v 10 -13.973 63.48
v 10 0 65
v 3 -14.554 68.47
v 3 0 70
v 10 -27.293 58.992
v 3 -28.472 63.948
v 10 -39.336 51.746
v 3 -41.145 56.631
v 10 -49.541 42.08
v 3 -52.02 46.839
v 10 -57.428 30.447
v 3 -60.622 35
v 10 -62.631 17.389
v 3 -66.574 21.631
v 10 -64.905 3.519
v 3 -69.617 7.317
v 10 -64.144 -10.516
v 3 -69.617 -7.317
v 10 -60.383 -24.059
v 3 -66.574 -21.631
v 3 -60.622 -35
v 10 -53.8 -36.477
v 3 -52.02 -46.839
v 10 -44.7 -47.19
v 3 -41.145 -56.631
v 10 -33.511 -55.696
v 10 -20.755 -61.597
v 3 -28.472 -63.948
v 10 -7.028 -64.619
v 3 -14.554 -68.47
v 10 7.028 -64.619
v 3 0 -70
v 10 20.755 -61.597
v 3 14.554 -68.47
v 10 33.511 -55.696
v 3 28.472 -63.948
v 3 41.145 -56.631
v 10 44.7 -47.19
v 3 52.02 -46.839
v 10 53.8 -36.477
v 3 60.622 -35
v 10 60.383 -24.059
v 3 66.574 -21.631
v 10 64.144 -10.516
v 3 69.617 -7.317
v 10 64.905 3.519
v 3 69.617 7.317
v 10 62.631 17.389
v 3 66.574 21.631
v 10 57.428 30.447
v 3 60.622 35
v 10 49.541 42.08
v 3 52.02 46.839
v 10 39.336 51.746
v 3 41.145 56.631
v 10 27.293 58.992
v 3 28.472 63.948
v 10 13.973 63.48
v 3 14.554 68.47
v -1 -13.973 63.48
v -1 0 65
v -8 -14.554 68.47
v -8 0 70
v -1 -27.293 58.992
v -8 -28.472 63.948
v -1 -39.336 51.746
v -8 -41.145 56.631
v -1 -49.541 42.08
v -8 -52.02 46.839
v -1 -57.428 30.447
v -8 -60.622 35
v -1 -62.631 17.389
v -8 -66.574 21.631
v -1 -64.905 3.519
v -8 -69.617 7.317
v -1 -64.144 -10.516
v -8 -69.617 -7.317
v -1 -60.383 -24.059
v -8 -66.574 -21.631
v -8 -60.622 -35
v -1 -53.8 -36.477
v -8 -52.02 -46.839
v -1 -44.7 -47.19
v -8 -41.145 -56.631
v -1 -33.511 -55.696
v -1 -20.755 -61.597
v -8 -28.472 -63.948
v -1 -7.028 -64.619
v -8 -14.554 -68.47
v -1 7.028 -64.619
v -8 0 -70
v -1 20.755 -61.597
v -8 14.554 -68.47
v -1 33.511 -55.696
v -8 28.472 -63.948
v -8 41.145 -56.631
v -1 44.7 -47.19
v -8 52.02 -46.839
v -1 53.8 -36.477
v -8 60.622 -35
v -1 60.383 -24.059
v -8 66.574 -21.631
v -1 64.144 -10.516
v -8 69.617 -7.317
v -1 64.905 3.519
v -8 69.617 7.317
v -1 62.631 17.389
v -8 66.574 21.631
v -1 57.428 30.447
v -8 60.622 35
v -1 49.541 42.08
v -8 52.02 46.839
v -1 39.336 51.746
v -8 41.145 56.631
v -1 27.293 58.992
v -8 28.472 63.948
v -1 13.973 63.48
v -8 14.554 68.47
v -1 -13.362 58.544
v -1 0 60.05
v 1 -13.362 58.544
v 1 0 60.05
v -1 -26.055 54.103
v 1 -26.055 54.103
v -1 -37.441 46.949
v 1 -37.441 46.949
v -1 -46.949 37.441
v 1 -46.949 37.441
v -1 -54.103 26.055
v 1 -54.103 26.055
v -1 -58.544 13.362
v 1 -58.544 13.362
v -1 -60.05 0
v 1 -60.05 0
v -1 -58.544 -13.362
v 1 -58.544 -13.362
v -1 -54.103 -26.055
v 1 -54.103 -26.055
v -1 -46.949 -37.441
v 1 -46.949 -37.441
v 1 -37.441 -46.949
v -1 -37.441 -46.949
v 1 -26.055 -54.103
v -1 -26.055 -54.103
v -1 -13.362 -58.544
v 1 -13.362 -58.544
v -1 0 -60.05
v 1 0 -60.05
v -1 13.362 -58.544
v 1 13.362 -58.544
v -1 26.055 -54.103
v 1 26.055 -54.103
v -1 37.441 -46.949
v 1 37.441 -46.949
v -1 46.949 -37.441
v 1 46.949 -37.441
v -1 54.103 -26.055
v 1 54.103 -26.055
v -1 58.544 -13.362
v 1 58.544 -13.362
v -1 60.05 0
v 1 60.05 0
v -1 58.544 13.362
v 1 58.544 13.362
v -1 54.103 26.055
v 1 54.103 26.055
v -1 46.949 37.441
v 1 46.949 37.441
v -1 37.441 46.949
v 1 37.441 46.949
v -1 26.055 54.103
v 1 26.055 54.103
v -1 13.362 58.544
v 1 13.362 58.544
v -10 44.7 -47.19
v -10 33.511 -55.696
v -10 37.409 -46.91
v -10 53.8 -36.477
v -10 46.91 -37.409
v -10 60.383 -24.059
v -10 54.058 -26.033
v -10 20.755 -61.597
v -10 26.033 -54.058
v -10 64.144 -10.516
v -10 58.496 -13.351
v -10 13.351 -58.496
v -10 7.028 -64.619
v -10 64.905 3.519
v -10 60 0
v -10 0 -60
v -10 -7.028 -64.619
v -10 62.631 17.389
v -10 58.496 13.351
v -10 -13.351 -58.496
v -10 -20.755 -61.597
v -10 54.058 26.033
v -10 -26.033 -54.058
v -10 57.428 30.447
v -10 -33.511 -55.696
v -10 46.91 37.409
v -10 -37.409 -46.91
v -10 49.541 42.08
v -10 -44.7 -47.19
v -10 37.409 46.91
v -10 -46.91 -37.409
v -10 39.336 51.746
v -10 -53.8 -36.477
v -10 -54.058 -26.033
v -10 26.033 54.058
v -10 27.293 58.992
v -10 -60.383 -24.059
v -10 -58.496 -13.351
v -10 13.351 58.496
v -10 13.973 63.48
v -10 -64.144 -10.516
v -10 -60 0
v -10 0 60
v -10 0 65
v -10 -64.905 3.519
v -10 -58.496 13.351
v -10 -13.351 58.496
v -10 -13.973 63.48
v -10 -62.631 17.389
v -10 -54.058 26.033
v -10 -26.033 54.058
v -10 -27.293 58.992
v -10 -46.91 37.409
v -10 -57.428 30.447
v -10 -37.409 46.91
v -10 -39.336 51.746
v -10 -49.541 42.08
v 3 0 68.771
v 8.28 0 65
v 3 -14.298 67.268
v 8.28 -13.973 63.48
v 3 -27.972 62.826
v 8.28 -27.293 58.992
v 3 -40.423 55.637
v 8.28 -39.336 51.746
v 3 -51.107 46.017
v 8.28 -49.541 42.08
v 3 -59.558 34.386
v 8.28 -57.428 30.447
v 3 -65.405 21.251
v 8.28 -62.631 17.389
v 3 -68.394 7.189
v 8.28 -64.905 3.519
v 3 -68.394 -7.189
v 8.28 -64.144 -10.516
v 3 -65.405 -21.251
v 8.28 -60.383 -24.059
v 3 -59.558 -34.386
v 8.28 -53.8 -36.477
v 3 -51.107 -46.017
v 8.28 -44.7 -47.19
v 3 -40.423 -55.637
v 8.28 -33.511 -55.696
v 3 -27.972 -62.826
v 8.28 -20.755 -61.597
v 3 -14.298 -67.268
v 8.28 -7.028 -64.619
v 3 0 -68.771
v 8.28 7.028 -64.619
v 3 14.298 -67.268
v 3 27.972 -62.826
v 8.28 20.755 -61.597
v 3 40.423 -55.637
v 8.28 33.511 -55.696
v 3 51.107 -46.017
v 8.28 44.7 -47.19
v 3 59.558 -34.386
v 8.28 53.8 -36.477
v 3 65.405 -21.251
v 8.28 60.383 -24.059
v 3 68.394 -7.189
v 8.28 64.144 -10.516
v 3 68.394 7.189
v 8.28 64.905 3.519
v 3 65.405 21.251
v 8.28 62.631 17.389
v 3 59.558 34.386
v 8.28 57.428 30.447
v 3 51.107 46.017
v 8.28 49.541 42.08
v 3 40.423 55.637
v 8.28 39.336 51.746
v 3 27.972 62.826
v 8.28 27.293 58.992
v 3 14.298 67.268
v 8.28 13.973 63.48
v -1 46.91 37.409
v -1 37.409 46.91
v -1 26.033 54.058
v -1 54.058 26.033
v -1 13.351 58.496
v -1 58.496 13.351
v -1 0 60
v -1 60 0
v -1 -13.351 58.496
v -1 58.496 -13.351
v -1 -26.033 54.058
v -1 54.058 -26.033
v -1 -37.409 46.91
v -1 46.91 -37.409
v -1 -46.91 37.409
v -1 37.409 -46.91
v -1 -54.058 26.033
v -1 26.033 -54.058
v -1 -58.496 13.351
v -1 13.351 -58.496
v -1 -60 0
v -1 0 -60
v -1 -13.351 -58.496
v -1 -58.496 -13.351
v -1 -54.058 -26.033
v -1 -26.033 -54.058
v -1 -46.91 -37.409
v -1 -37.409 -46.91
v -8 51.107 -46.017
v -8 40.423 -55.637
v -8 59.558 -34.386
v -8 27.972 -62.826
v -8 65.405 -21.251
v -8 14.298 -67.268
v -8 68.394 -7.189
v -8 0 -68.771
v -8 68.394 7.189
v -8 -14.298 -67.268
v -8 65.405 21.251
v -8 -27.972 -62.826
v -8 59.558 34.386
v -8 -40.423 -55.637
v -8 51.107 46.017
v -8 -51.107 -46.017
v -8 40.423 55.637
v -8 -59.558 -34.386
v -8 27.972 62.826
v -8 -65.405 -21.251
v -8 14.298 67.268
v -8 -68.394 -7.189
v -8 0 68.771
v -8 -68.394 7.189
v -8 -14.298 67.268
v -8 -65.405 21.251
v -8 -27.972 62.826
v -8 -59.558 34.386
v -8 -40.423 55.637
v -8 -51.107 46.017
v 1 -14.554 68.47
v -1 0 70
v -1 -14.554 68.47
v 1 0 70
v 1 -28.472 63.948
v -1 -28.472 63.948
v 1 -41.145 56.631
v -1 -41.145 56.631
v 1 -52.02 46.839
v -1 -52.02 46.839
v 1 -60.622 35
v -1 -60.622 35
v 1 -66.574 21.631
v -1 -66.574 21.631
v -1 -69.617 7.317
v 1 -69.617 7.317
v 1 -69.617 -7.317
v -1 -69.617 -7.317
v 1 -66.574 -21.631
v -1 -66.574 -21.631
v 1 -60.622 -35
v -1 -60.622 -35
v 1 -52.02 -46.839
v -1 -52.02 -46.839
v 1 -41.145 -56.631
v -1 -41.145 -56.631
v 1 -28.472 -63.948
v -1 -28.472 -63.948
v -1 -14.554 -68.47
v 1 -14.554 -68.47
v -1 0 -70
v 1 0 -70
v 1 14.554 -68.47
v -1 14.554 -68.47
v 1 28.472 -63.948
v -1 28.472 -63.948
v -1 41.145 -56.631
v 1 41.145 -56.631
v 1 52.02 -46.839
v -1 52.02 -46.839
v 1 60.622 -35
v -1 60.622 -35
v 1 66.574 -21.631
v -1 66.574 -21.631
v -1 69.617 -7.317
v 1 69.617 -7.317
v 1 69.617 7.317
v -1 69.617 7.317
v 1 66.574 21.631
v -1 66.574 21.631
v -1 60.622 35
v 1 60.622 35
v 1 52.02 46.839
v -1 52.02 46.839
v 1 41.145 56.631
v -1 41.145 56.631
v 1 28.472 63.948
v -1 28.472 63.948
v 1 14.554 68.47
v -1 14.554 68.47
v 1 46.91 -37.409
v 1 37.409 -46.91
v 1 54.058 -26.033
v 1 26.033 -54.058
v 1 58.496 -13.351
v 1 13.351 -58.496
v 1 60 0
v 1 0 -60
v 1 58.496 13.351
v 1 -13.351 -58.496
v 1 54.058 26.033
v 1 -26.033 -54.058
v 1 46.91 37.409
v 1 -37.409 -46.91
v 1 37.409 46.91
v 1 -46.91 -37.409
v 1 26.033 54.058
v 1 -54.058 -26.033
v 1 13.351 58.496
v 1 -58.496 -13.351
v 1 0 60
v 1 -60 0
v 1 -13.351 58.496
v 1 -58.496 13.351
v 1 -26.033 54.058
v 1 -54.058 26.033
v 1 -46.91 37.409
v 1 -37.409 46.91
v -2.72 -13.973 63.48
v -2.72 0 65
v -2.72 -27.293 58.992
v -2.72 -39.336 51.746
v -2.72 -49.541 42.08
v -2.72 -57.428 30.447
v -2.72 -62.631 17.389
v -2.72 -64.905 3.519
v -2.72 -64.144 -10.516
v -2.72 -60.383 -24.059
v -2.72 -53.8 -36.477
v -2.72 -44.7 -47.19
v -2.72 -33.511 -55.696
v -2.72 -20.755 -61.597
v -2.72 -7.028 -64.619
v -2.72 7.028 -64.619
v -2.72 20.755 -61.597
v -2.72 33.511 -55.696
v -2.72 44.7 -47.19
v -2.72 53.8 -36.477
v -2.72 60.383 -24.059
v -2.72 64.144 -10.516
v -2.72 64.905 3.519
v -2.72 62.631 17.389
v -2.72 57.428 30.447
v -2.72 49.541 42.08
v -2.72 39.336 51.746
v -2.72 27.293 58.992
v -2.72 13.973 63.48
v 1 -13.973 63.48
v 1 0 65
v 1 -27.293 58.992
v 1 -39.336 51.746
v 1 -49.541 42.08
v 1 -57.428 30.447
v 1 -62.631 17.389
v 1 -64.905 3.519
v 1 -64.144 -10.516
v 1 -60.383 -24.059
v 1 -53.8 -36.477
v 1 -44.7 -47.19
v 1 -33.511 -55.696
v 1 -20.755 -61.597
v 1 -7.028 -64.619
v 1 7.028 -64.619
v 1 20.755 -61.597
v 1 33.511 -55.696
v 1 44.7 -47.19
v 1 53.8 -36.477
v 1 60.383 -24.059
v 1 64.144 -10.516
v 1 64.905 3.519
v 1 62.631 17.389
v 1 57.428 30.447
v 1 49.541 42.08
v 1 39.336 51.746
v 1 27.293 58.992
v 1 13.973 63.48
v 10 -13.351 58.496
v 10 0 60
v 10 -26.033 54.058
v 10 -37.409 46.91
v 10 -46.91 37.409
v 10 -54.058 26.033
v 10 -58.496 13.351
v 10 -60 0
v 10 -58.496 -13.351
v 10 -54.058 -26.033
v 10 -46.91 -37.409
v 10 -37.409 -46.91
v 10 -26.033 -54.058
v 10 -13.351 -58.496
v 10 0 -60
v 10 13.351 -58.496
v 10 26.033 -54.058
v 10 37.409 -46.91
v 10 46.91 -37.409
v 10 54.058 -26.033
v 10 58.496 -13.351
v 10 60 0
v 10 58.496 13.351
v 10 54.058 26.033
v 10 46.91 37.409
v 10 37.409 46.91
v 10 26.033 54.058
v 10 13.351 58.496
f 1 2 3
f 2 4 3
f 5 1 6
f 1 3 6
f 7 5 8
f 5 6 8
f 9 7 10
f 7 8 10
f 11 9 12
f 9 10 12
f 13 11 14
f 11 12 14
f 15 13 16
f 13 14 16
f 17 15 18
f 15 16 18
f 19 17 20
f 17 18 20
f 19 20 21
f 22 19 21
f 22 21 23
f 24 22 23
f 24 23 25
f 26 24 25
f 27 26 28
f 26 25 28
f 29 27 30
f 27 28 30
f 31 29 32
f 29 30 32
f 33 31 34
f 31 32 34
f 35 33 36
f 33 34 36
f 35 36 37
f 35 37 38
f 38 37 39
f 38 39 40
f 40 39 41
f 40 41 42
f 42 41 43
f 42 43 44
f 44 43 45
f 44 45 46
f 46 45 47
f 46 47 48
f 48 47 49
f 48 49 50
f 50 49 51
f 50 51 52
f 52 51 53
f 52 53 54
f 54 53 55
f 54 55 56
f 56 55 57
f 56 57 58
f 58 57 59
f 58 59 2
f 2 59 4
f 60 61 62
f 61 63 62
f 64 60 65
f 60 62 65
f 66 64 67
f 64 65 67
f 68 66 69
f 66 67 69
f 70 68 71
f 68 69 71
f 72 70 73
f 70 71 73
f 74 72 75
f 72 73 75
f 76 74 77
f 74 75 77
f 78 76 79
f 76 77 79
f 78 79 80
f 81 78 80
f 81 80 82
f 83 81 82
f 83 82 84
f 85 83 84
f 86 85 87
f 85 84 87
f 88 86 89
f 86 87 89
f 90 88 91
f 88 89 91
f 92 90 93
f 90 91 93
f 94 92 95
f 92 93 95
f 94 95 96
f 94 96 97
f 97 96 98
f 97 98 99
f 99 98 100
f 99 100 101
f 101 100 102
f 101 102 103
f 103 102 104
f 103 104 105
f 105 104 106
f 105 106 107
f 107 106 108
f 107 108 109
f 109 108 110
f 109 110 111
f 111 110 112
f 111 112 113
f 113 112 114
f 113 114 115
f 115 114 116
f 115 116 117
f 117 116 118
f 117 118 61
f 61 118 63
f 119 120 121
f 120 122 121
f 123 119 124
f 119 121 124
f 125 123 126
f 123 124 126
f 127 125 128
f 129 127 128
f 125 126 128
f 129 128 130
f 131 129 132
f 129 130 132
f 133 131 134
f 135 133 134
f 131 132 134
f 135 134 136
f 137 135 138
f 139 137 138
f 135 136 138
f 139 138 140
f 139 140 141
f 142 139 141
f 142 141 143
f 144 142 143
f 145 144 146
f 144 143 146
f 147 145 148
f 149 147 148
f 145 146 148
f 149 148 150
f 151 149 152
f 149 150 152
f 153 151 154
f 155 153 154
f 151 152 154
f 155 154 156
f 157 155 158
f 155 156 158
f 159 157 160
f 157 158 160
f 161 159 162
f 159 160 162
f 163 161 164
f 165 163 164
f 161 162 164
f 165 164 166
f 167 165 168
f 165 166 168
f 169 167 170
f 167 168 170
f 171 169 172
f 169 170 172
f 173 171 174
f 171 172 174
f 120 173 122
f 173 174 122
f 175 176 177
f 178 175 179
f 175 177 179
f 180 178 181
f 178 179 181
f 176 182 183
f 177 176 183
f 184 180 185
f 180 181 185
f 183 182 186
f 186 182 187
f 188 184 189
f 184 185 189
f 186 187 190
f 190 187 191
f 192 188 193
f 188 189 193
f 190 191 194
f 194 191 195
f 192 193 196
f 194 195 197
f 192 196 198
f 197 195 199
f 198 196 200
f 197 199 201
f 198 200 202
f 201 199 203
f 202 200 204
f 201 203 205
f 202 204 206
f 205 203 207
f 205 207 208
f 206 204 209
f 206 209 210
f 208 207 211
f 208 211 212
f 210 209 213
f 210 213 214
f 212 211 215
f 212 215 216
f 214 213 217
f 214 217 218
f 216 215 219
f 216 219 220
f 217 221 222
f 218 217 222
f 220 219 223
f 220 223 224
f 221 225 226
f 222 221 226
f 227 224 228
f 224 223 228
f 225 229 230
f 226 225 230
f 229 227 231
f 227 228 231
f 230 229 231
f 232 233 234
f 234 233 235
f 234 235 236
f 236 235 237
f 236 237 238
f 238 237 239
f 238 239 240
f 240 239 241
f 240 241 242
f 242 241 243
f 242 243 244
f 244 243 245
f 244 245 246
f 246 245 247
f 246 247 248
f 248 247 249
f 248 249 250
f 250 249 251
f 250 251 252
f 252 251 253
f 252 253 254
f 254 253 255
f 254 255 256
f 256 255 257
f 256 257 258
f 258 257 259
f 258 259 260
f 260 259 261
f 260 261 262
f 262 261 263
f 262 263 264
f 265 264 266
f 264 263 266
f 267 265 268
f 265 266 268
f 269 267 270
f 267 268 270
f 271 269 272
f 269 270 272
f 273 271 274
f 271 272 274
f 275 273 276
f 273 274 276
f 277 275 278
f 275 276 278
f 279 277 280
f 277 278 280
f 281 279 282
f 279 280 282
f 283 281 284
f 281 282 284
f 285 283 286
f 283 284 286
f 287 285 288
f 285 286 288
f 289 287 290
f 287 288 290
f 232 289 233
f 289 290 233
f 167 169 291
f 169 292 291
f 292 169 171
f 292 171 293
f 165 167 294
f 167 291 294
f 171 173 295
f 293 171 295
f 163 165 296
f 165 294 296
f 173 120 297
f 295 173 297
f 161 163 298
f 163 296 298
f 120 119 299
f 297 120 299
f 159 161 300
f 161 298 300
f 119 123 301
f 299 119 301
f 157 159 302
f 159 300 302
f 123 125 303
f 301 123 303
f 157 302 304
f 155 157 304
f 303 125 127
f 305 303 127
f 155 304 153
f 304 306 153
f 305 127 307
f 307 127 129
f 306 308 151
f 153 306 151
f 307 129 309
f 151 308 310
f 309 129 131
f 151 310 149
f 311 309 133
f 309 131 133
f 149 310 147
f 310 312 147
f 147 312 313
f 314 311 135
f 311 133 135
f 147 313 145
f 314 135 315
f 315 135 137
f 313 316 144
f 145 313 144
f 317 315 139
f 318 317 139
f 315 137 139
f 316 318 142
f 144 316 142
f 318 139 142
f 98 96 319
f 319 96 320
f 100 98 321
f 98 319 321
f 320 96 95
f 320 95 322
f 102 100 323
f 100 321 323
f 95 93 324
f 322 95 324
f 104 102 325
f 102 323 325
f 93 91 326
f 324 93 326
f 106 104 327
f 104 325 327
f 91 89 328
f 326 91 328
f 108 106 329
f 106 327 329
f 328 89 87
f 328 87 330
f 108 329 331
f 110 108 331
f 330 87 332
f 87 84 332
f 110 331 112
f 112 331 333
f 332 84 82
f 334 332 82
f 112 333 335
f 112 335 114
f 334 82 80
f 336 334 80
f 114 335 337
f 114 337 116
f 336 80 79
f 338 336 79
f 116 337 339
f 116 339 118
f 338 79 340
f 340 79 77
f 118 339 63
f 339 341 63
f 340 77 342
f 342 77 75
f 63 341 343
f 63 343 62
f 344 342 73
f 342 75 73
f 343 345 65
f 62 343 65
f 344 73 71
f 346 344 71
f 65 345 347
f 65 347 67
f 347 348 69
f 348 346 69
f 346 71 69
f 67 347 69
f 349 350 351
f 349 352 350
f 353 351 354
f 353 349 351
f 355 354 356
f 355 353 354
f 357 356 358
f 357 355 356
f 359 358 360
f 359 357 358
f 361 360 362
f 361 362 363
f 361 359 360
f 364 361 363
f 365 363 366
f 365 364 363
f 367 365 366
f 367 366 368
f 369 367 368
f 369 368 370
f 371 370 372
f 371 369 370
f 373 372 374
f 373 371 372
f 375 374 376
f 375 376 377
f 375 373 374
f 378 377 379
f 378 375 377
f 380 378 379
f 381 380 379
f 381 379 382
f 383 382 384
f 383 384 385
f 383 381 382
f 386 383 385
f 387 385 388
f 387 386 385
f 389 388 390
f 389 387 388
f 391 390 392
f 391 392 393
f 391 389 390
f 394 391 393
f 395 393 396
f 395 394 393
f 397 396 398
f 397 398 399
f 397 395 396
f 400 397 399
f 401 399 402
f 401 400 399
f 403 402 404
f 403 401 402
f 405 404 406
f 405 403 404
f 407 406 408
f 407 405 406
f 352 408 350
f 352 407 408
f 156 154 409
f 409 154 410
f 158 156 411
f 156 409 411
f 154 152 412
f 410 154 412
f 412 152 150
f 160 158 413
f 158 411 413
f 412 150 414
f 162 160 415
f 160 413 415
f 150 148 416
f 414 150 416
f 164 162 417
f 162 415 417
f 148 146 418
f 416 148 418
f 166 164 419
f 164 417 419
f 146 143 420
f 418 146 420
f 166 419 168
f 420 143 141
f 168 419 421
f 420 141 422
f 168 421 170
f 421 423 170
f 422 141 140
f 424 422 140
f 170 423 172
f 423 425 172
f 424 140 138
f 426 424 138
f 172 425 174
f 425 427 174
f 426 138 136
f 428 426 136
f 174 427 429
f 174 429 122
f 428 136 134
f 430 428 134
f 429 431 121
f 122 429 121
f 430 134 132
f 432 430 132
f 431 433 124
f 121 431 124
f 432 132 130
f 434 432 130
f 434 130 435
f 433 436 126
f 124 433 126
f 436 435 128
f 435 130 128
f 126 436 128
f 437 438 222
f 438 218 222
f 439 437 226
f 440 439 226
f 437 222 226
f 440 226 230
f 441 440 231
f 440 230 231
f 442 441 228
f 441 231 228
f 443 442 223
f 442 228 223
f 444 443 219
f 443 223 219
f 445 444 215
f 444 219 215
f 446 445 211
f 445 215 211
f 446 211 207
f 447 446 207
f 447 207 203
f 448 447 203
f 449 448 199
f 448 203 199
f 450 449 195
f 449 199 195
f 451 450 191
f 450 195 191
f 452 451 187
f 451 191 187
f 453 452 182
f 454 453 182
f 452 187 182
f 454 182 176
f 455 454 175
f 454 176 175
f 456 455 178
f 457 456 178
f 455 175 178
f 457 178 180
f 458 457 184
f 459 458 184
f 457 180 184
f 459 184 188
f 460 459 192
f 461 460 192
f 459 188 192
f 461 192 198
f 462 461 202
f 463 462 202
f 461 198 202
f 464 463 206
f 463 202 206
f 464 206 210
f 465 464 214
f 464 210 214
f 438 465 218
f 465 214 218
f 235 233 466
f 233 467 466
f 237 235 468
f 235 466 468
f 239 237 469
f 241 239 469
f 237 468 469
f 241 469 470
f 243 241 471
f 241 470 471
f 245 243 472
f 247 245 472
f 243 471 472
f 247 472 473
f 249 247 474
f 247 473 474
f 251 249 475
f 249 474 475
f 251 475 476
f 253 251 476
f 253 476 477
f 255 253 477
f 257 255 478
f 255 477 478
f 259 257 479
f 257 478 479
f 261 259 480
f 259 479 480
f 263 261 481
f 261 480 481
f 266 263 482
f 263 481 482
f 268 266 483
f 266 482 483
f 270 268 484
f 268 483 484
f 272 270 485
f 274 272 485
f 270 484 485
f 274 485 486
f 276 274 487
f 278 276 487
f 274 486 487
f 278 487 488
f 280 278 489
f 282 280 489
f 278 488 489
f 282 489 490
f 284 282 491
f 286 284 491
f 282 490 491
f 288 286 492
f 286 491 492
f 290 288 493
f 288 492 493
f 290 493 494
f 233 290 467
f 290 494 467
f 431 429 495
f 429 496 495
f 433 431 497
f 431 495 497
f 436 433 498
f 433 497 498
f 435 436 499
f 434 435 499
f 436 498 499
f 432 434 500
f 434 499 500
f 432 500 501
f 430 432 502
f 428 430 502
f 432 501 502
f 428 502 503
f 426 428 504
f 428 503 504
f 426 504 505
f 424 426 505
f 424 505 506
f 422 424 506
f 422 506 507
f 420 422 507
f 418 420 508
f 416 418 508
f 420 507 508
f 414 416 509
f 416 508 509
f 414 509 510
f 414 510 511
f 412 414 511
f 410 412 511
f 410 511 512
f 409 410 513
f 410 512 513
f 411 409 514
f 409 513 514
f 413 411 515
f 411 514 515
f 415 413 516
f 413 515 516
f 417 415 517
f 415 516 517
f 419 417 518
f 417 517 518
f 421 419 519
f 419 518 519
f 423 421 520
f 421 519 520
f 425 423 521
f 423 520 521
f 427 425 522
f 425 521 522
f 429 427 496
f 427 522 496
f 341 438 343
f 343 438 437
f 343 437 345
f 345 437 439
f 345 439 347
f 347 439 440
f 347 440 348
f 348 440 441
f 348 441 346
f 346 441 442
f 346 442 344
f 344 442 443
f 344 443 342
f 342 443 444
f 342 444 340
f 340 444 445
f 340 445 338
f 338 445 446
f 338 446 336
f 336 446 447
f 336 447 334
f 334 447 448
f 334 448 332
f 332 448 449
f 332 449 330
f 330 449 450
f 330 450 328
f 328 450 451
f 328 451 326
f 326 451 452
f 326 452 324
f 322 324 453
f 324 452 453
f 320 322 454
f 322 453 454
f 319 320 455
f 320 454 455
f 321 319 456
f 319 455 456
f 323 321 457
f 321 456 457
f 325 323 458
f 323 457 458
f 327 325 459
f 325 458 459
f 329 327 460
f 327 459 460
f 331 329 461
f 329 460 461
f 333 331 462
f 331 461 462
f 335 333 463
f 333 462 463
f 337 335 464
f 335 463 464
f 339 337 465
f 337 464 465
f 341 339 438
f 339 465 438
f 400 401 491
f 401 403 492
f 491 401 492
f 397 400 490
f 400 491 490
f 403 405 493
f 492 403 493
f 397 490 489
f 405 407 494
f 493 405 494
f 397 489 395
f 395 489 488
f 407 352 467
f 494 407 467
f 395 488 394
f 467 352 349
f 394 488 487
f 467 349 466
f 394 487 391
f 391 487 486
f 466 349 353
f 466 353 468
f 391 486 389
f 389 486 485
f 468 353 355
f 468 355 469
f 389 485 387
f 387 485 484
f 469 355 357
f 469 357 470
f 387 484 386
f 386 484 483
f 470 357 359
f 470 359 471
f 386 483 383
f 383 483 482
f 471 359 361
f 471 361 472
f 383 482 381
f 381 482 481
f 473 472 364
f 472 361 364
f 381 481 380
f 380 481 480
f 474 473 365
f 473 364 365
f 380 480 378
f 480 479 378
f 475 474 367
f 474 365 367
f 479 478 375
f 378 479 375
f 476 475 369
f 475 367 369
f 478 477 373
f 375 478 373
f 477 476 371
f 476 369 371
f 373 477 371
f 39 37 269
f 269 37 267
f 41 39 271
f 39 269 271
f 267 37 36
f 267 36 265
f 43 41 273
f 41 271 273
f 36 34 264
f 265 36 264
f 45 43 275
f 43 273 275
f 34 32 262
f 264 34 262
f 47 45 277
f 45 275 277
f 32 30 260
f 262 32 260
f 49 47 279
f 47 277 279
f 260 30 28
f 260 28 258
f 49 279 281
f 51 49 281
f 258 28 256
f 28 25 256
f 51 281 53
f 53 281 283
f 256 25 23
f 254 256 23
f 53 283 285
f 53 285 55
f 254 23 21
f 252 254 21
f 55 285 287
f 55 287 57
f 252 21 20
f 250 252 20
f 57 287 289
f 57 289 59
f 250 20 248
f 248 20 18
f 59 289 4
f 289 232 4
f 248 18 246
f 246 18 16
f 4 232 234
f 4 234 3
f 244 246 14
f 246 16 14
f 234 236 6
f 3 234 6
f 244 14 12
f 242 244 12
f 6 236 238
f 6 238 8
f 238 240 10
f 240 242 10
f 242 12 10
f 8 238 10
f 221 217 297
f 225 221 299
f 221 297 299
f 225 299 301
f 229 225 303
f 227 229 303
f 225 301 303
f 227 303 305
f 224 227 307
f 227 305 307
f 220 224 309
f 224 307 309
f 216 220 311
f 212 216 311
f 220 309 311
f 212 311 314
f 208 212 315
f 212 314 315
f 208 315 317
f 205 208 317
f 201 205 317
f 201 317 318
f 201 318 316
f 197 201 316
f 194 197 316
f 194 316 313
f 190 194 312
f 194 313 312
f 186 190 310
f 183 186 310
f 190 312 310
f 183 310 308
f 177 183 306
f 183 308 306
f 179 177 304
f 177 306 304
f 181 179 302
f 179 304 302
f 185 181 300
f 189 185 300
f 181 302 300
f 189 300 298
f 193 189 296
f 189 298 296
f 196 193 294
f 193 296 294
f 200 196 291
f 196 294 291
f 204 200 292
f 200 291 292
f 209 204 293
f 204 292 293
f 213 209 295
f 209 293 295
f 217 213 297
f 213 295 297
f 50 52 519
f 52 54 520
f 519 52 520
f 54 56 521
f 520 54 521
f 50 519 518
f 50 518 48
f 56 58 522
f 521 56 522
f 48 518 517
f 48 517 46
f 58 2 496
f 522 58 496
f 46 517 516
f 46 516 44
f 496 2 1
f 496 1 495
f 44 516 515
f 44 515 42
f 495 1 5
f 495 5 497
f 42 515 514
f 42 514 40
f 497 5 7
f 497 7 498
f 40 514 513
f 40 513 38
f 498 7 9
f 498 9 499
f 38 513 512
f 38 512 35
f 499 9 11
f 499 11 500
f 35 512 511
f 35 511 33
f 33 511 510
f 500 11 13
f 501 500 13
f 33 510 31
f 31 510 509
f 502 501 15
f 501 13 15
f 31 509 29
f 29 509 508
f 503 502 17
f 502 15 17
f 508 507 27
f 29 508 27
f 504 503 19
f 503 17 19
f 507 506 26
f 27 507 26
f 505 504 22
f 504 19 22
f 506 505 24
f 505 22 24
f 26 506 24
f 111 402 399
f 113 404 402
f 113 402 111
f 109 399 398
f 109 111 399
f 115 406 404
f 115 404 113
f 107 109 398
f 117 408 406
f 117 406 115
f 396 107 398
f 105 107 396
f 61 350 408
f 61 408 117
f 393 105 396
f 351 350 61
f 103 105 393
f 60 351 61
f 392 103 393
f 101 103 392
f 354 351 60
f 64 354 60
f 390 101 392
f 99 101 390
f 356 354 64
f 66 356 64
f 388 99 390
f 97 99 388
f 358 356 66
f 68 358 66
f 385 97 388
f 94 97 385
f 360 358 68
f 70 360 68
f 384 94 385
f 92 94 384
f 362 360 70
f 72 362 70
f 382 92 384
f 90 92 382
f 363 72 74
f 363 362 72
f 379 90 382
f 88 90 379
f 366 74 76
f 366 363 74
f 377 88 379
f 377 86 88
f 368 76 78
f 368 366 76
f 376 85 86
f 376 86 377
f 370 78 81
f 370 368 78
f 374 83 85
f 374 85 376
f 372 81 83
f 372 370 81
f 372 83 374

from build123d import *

# Parameters (mm, degrees)
F0_W = 2
F0_H = 9.95


with BuildPart() as f1:
    # F0 (on Front) → F1 (revolve)
    with BuildSketch(Plane.XZ):
        with Locations((0, 65.025)):
            Rectangle(F0_W, F0_H)
    revolve(axis=Axis((8.224491, 0, 0), (1, 0, 0)))

    # F2 (on Front) → F3 (revolve)
    with BuildSketch(Plane.XZ):
        Polygon((-2.720465, 65), (-10, 65), (-10, 60), (-1, 60), (-1, 65), (-8, 70), (-8, 68.771096), align=None)
        Polygon((8.279535, 65), (1, 65), (1, 60), (10, 60), (10, 65), (3, 70), (3, 68.771096), align=None)
    revolve(axis=Axis((3.221242, 0, 0), (1, 0, 0)))


solid = f1.part
